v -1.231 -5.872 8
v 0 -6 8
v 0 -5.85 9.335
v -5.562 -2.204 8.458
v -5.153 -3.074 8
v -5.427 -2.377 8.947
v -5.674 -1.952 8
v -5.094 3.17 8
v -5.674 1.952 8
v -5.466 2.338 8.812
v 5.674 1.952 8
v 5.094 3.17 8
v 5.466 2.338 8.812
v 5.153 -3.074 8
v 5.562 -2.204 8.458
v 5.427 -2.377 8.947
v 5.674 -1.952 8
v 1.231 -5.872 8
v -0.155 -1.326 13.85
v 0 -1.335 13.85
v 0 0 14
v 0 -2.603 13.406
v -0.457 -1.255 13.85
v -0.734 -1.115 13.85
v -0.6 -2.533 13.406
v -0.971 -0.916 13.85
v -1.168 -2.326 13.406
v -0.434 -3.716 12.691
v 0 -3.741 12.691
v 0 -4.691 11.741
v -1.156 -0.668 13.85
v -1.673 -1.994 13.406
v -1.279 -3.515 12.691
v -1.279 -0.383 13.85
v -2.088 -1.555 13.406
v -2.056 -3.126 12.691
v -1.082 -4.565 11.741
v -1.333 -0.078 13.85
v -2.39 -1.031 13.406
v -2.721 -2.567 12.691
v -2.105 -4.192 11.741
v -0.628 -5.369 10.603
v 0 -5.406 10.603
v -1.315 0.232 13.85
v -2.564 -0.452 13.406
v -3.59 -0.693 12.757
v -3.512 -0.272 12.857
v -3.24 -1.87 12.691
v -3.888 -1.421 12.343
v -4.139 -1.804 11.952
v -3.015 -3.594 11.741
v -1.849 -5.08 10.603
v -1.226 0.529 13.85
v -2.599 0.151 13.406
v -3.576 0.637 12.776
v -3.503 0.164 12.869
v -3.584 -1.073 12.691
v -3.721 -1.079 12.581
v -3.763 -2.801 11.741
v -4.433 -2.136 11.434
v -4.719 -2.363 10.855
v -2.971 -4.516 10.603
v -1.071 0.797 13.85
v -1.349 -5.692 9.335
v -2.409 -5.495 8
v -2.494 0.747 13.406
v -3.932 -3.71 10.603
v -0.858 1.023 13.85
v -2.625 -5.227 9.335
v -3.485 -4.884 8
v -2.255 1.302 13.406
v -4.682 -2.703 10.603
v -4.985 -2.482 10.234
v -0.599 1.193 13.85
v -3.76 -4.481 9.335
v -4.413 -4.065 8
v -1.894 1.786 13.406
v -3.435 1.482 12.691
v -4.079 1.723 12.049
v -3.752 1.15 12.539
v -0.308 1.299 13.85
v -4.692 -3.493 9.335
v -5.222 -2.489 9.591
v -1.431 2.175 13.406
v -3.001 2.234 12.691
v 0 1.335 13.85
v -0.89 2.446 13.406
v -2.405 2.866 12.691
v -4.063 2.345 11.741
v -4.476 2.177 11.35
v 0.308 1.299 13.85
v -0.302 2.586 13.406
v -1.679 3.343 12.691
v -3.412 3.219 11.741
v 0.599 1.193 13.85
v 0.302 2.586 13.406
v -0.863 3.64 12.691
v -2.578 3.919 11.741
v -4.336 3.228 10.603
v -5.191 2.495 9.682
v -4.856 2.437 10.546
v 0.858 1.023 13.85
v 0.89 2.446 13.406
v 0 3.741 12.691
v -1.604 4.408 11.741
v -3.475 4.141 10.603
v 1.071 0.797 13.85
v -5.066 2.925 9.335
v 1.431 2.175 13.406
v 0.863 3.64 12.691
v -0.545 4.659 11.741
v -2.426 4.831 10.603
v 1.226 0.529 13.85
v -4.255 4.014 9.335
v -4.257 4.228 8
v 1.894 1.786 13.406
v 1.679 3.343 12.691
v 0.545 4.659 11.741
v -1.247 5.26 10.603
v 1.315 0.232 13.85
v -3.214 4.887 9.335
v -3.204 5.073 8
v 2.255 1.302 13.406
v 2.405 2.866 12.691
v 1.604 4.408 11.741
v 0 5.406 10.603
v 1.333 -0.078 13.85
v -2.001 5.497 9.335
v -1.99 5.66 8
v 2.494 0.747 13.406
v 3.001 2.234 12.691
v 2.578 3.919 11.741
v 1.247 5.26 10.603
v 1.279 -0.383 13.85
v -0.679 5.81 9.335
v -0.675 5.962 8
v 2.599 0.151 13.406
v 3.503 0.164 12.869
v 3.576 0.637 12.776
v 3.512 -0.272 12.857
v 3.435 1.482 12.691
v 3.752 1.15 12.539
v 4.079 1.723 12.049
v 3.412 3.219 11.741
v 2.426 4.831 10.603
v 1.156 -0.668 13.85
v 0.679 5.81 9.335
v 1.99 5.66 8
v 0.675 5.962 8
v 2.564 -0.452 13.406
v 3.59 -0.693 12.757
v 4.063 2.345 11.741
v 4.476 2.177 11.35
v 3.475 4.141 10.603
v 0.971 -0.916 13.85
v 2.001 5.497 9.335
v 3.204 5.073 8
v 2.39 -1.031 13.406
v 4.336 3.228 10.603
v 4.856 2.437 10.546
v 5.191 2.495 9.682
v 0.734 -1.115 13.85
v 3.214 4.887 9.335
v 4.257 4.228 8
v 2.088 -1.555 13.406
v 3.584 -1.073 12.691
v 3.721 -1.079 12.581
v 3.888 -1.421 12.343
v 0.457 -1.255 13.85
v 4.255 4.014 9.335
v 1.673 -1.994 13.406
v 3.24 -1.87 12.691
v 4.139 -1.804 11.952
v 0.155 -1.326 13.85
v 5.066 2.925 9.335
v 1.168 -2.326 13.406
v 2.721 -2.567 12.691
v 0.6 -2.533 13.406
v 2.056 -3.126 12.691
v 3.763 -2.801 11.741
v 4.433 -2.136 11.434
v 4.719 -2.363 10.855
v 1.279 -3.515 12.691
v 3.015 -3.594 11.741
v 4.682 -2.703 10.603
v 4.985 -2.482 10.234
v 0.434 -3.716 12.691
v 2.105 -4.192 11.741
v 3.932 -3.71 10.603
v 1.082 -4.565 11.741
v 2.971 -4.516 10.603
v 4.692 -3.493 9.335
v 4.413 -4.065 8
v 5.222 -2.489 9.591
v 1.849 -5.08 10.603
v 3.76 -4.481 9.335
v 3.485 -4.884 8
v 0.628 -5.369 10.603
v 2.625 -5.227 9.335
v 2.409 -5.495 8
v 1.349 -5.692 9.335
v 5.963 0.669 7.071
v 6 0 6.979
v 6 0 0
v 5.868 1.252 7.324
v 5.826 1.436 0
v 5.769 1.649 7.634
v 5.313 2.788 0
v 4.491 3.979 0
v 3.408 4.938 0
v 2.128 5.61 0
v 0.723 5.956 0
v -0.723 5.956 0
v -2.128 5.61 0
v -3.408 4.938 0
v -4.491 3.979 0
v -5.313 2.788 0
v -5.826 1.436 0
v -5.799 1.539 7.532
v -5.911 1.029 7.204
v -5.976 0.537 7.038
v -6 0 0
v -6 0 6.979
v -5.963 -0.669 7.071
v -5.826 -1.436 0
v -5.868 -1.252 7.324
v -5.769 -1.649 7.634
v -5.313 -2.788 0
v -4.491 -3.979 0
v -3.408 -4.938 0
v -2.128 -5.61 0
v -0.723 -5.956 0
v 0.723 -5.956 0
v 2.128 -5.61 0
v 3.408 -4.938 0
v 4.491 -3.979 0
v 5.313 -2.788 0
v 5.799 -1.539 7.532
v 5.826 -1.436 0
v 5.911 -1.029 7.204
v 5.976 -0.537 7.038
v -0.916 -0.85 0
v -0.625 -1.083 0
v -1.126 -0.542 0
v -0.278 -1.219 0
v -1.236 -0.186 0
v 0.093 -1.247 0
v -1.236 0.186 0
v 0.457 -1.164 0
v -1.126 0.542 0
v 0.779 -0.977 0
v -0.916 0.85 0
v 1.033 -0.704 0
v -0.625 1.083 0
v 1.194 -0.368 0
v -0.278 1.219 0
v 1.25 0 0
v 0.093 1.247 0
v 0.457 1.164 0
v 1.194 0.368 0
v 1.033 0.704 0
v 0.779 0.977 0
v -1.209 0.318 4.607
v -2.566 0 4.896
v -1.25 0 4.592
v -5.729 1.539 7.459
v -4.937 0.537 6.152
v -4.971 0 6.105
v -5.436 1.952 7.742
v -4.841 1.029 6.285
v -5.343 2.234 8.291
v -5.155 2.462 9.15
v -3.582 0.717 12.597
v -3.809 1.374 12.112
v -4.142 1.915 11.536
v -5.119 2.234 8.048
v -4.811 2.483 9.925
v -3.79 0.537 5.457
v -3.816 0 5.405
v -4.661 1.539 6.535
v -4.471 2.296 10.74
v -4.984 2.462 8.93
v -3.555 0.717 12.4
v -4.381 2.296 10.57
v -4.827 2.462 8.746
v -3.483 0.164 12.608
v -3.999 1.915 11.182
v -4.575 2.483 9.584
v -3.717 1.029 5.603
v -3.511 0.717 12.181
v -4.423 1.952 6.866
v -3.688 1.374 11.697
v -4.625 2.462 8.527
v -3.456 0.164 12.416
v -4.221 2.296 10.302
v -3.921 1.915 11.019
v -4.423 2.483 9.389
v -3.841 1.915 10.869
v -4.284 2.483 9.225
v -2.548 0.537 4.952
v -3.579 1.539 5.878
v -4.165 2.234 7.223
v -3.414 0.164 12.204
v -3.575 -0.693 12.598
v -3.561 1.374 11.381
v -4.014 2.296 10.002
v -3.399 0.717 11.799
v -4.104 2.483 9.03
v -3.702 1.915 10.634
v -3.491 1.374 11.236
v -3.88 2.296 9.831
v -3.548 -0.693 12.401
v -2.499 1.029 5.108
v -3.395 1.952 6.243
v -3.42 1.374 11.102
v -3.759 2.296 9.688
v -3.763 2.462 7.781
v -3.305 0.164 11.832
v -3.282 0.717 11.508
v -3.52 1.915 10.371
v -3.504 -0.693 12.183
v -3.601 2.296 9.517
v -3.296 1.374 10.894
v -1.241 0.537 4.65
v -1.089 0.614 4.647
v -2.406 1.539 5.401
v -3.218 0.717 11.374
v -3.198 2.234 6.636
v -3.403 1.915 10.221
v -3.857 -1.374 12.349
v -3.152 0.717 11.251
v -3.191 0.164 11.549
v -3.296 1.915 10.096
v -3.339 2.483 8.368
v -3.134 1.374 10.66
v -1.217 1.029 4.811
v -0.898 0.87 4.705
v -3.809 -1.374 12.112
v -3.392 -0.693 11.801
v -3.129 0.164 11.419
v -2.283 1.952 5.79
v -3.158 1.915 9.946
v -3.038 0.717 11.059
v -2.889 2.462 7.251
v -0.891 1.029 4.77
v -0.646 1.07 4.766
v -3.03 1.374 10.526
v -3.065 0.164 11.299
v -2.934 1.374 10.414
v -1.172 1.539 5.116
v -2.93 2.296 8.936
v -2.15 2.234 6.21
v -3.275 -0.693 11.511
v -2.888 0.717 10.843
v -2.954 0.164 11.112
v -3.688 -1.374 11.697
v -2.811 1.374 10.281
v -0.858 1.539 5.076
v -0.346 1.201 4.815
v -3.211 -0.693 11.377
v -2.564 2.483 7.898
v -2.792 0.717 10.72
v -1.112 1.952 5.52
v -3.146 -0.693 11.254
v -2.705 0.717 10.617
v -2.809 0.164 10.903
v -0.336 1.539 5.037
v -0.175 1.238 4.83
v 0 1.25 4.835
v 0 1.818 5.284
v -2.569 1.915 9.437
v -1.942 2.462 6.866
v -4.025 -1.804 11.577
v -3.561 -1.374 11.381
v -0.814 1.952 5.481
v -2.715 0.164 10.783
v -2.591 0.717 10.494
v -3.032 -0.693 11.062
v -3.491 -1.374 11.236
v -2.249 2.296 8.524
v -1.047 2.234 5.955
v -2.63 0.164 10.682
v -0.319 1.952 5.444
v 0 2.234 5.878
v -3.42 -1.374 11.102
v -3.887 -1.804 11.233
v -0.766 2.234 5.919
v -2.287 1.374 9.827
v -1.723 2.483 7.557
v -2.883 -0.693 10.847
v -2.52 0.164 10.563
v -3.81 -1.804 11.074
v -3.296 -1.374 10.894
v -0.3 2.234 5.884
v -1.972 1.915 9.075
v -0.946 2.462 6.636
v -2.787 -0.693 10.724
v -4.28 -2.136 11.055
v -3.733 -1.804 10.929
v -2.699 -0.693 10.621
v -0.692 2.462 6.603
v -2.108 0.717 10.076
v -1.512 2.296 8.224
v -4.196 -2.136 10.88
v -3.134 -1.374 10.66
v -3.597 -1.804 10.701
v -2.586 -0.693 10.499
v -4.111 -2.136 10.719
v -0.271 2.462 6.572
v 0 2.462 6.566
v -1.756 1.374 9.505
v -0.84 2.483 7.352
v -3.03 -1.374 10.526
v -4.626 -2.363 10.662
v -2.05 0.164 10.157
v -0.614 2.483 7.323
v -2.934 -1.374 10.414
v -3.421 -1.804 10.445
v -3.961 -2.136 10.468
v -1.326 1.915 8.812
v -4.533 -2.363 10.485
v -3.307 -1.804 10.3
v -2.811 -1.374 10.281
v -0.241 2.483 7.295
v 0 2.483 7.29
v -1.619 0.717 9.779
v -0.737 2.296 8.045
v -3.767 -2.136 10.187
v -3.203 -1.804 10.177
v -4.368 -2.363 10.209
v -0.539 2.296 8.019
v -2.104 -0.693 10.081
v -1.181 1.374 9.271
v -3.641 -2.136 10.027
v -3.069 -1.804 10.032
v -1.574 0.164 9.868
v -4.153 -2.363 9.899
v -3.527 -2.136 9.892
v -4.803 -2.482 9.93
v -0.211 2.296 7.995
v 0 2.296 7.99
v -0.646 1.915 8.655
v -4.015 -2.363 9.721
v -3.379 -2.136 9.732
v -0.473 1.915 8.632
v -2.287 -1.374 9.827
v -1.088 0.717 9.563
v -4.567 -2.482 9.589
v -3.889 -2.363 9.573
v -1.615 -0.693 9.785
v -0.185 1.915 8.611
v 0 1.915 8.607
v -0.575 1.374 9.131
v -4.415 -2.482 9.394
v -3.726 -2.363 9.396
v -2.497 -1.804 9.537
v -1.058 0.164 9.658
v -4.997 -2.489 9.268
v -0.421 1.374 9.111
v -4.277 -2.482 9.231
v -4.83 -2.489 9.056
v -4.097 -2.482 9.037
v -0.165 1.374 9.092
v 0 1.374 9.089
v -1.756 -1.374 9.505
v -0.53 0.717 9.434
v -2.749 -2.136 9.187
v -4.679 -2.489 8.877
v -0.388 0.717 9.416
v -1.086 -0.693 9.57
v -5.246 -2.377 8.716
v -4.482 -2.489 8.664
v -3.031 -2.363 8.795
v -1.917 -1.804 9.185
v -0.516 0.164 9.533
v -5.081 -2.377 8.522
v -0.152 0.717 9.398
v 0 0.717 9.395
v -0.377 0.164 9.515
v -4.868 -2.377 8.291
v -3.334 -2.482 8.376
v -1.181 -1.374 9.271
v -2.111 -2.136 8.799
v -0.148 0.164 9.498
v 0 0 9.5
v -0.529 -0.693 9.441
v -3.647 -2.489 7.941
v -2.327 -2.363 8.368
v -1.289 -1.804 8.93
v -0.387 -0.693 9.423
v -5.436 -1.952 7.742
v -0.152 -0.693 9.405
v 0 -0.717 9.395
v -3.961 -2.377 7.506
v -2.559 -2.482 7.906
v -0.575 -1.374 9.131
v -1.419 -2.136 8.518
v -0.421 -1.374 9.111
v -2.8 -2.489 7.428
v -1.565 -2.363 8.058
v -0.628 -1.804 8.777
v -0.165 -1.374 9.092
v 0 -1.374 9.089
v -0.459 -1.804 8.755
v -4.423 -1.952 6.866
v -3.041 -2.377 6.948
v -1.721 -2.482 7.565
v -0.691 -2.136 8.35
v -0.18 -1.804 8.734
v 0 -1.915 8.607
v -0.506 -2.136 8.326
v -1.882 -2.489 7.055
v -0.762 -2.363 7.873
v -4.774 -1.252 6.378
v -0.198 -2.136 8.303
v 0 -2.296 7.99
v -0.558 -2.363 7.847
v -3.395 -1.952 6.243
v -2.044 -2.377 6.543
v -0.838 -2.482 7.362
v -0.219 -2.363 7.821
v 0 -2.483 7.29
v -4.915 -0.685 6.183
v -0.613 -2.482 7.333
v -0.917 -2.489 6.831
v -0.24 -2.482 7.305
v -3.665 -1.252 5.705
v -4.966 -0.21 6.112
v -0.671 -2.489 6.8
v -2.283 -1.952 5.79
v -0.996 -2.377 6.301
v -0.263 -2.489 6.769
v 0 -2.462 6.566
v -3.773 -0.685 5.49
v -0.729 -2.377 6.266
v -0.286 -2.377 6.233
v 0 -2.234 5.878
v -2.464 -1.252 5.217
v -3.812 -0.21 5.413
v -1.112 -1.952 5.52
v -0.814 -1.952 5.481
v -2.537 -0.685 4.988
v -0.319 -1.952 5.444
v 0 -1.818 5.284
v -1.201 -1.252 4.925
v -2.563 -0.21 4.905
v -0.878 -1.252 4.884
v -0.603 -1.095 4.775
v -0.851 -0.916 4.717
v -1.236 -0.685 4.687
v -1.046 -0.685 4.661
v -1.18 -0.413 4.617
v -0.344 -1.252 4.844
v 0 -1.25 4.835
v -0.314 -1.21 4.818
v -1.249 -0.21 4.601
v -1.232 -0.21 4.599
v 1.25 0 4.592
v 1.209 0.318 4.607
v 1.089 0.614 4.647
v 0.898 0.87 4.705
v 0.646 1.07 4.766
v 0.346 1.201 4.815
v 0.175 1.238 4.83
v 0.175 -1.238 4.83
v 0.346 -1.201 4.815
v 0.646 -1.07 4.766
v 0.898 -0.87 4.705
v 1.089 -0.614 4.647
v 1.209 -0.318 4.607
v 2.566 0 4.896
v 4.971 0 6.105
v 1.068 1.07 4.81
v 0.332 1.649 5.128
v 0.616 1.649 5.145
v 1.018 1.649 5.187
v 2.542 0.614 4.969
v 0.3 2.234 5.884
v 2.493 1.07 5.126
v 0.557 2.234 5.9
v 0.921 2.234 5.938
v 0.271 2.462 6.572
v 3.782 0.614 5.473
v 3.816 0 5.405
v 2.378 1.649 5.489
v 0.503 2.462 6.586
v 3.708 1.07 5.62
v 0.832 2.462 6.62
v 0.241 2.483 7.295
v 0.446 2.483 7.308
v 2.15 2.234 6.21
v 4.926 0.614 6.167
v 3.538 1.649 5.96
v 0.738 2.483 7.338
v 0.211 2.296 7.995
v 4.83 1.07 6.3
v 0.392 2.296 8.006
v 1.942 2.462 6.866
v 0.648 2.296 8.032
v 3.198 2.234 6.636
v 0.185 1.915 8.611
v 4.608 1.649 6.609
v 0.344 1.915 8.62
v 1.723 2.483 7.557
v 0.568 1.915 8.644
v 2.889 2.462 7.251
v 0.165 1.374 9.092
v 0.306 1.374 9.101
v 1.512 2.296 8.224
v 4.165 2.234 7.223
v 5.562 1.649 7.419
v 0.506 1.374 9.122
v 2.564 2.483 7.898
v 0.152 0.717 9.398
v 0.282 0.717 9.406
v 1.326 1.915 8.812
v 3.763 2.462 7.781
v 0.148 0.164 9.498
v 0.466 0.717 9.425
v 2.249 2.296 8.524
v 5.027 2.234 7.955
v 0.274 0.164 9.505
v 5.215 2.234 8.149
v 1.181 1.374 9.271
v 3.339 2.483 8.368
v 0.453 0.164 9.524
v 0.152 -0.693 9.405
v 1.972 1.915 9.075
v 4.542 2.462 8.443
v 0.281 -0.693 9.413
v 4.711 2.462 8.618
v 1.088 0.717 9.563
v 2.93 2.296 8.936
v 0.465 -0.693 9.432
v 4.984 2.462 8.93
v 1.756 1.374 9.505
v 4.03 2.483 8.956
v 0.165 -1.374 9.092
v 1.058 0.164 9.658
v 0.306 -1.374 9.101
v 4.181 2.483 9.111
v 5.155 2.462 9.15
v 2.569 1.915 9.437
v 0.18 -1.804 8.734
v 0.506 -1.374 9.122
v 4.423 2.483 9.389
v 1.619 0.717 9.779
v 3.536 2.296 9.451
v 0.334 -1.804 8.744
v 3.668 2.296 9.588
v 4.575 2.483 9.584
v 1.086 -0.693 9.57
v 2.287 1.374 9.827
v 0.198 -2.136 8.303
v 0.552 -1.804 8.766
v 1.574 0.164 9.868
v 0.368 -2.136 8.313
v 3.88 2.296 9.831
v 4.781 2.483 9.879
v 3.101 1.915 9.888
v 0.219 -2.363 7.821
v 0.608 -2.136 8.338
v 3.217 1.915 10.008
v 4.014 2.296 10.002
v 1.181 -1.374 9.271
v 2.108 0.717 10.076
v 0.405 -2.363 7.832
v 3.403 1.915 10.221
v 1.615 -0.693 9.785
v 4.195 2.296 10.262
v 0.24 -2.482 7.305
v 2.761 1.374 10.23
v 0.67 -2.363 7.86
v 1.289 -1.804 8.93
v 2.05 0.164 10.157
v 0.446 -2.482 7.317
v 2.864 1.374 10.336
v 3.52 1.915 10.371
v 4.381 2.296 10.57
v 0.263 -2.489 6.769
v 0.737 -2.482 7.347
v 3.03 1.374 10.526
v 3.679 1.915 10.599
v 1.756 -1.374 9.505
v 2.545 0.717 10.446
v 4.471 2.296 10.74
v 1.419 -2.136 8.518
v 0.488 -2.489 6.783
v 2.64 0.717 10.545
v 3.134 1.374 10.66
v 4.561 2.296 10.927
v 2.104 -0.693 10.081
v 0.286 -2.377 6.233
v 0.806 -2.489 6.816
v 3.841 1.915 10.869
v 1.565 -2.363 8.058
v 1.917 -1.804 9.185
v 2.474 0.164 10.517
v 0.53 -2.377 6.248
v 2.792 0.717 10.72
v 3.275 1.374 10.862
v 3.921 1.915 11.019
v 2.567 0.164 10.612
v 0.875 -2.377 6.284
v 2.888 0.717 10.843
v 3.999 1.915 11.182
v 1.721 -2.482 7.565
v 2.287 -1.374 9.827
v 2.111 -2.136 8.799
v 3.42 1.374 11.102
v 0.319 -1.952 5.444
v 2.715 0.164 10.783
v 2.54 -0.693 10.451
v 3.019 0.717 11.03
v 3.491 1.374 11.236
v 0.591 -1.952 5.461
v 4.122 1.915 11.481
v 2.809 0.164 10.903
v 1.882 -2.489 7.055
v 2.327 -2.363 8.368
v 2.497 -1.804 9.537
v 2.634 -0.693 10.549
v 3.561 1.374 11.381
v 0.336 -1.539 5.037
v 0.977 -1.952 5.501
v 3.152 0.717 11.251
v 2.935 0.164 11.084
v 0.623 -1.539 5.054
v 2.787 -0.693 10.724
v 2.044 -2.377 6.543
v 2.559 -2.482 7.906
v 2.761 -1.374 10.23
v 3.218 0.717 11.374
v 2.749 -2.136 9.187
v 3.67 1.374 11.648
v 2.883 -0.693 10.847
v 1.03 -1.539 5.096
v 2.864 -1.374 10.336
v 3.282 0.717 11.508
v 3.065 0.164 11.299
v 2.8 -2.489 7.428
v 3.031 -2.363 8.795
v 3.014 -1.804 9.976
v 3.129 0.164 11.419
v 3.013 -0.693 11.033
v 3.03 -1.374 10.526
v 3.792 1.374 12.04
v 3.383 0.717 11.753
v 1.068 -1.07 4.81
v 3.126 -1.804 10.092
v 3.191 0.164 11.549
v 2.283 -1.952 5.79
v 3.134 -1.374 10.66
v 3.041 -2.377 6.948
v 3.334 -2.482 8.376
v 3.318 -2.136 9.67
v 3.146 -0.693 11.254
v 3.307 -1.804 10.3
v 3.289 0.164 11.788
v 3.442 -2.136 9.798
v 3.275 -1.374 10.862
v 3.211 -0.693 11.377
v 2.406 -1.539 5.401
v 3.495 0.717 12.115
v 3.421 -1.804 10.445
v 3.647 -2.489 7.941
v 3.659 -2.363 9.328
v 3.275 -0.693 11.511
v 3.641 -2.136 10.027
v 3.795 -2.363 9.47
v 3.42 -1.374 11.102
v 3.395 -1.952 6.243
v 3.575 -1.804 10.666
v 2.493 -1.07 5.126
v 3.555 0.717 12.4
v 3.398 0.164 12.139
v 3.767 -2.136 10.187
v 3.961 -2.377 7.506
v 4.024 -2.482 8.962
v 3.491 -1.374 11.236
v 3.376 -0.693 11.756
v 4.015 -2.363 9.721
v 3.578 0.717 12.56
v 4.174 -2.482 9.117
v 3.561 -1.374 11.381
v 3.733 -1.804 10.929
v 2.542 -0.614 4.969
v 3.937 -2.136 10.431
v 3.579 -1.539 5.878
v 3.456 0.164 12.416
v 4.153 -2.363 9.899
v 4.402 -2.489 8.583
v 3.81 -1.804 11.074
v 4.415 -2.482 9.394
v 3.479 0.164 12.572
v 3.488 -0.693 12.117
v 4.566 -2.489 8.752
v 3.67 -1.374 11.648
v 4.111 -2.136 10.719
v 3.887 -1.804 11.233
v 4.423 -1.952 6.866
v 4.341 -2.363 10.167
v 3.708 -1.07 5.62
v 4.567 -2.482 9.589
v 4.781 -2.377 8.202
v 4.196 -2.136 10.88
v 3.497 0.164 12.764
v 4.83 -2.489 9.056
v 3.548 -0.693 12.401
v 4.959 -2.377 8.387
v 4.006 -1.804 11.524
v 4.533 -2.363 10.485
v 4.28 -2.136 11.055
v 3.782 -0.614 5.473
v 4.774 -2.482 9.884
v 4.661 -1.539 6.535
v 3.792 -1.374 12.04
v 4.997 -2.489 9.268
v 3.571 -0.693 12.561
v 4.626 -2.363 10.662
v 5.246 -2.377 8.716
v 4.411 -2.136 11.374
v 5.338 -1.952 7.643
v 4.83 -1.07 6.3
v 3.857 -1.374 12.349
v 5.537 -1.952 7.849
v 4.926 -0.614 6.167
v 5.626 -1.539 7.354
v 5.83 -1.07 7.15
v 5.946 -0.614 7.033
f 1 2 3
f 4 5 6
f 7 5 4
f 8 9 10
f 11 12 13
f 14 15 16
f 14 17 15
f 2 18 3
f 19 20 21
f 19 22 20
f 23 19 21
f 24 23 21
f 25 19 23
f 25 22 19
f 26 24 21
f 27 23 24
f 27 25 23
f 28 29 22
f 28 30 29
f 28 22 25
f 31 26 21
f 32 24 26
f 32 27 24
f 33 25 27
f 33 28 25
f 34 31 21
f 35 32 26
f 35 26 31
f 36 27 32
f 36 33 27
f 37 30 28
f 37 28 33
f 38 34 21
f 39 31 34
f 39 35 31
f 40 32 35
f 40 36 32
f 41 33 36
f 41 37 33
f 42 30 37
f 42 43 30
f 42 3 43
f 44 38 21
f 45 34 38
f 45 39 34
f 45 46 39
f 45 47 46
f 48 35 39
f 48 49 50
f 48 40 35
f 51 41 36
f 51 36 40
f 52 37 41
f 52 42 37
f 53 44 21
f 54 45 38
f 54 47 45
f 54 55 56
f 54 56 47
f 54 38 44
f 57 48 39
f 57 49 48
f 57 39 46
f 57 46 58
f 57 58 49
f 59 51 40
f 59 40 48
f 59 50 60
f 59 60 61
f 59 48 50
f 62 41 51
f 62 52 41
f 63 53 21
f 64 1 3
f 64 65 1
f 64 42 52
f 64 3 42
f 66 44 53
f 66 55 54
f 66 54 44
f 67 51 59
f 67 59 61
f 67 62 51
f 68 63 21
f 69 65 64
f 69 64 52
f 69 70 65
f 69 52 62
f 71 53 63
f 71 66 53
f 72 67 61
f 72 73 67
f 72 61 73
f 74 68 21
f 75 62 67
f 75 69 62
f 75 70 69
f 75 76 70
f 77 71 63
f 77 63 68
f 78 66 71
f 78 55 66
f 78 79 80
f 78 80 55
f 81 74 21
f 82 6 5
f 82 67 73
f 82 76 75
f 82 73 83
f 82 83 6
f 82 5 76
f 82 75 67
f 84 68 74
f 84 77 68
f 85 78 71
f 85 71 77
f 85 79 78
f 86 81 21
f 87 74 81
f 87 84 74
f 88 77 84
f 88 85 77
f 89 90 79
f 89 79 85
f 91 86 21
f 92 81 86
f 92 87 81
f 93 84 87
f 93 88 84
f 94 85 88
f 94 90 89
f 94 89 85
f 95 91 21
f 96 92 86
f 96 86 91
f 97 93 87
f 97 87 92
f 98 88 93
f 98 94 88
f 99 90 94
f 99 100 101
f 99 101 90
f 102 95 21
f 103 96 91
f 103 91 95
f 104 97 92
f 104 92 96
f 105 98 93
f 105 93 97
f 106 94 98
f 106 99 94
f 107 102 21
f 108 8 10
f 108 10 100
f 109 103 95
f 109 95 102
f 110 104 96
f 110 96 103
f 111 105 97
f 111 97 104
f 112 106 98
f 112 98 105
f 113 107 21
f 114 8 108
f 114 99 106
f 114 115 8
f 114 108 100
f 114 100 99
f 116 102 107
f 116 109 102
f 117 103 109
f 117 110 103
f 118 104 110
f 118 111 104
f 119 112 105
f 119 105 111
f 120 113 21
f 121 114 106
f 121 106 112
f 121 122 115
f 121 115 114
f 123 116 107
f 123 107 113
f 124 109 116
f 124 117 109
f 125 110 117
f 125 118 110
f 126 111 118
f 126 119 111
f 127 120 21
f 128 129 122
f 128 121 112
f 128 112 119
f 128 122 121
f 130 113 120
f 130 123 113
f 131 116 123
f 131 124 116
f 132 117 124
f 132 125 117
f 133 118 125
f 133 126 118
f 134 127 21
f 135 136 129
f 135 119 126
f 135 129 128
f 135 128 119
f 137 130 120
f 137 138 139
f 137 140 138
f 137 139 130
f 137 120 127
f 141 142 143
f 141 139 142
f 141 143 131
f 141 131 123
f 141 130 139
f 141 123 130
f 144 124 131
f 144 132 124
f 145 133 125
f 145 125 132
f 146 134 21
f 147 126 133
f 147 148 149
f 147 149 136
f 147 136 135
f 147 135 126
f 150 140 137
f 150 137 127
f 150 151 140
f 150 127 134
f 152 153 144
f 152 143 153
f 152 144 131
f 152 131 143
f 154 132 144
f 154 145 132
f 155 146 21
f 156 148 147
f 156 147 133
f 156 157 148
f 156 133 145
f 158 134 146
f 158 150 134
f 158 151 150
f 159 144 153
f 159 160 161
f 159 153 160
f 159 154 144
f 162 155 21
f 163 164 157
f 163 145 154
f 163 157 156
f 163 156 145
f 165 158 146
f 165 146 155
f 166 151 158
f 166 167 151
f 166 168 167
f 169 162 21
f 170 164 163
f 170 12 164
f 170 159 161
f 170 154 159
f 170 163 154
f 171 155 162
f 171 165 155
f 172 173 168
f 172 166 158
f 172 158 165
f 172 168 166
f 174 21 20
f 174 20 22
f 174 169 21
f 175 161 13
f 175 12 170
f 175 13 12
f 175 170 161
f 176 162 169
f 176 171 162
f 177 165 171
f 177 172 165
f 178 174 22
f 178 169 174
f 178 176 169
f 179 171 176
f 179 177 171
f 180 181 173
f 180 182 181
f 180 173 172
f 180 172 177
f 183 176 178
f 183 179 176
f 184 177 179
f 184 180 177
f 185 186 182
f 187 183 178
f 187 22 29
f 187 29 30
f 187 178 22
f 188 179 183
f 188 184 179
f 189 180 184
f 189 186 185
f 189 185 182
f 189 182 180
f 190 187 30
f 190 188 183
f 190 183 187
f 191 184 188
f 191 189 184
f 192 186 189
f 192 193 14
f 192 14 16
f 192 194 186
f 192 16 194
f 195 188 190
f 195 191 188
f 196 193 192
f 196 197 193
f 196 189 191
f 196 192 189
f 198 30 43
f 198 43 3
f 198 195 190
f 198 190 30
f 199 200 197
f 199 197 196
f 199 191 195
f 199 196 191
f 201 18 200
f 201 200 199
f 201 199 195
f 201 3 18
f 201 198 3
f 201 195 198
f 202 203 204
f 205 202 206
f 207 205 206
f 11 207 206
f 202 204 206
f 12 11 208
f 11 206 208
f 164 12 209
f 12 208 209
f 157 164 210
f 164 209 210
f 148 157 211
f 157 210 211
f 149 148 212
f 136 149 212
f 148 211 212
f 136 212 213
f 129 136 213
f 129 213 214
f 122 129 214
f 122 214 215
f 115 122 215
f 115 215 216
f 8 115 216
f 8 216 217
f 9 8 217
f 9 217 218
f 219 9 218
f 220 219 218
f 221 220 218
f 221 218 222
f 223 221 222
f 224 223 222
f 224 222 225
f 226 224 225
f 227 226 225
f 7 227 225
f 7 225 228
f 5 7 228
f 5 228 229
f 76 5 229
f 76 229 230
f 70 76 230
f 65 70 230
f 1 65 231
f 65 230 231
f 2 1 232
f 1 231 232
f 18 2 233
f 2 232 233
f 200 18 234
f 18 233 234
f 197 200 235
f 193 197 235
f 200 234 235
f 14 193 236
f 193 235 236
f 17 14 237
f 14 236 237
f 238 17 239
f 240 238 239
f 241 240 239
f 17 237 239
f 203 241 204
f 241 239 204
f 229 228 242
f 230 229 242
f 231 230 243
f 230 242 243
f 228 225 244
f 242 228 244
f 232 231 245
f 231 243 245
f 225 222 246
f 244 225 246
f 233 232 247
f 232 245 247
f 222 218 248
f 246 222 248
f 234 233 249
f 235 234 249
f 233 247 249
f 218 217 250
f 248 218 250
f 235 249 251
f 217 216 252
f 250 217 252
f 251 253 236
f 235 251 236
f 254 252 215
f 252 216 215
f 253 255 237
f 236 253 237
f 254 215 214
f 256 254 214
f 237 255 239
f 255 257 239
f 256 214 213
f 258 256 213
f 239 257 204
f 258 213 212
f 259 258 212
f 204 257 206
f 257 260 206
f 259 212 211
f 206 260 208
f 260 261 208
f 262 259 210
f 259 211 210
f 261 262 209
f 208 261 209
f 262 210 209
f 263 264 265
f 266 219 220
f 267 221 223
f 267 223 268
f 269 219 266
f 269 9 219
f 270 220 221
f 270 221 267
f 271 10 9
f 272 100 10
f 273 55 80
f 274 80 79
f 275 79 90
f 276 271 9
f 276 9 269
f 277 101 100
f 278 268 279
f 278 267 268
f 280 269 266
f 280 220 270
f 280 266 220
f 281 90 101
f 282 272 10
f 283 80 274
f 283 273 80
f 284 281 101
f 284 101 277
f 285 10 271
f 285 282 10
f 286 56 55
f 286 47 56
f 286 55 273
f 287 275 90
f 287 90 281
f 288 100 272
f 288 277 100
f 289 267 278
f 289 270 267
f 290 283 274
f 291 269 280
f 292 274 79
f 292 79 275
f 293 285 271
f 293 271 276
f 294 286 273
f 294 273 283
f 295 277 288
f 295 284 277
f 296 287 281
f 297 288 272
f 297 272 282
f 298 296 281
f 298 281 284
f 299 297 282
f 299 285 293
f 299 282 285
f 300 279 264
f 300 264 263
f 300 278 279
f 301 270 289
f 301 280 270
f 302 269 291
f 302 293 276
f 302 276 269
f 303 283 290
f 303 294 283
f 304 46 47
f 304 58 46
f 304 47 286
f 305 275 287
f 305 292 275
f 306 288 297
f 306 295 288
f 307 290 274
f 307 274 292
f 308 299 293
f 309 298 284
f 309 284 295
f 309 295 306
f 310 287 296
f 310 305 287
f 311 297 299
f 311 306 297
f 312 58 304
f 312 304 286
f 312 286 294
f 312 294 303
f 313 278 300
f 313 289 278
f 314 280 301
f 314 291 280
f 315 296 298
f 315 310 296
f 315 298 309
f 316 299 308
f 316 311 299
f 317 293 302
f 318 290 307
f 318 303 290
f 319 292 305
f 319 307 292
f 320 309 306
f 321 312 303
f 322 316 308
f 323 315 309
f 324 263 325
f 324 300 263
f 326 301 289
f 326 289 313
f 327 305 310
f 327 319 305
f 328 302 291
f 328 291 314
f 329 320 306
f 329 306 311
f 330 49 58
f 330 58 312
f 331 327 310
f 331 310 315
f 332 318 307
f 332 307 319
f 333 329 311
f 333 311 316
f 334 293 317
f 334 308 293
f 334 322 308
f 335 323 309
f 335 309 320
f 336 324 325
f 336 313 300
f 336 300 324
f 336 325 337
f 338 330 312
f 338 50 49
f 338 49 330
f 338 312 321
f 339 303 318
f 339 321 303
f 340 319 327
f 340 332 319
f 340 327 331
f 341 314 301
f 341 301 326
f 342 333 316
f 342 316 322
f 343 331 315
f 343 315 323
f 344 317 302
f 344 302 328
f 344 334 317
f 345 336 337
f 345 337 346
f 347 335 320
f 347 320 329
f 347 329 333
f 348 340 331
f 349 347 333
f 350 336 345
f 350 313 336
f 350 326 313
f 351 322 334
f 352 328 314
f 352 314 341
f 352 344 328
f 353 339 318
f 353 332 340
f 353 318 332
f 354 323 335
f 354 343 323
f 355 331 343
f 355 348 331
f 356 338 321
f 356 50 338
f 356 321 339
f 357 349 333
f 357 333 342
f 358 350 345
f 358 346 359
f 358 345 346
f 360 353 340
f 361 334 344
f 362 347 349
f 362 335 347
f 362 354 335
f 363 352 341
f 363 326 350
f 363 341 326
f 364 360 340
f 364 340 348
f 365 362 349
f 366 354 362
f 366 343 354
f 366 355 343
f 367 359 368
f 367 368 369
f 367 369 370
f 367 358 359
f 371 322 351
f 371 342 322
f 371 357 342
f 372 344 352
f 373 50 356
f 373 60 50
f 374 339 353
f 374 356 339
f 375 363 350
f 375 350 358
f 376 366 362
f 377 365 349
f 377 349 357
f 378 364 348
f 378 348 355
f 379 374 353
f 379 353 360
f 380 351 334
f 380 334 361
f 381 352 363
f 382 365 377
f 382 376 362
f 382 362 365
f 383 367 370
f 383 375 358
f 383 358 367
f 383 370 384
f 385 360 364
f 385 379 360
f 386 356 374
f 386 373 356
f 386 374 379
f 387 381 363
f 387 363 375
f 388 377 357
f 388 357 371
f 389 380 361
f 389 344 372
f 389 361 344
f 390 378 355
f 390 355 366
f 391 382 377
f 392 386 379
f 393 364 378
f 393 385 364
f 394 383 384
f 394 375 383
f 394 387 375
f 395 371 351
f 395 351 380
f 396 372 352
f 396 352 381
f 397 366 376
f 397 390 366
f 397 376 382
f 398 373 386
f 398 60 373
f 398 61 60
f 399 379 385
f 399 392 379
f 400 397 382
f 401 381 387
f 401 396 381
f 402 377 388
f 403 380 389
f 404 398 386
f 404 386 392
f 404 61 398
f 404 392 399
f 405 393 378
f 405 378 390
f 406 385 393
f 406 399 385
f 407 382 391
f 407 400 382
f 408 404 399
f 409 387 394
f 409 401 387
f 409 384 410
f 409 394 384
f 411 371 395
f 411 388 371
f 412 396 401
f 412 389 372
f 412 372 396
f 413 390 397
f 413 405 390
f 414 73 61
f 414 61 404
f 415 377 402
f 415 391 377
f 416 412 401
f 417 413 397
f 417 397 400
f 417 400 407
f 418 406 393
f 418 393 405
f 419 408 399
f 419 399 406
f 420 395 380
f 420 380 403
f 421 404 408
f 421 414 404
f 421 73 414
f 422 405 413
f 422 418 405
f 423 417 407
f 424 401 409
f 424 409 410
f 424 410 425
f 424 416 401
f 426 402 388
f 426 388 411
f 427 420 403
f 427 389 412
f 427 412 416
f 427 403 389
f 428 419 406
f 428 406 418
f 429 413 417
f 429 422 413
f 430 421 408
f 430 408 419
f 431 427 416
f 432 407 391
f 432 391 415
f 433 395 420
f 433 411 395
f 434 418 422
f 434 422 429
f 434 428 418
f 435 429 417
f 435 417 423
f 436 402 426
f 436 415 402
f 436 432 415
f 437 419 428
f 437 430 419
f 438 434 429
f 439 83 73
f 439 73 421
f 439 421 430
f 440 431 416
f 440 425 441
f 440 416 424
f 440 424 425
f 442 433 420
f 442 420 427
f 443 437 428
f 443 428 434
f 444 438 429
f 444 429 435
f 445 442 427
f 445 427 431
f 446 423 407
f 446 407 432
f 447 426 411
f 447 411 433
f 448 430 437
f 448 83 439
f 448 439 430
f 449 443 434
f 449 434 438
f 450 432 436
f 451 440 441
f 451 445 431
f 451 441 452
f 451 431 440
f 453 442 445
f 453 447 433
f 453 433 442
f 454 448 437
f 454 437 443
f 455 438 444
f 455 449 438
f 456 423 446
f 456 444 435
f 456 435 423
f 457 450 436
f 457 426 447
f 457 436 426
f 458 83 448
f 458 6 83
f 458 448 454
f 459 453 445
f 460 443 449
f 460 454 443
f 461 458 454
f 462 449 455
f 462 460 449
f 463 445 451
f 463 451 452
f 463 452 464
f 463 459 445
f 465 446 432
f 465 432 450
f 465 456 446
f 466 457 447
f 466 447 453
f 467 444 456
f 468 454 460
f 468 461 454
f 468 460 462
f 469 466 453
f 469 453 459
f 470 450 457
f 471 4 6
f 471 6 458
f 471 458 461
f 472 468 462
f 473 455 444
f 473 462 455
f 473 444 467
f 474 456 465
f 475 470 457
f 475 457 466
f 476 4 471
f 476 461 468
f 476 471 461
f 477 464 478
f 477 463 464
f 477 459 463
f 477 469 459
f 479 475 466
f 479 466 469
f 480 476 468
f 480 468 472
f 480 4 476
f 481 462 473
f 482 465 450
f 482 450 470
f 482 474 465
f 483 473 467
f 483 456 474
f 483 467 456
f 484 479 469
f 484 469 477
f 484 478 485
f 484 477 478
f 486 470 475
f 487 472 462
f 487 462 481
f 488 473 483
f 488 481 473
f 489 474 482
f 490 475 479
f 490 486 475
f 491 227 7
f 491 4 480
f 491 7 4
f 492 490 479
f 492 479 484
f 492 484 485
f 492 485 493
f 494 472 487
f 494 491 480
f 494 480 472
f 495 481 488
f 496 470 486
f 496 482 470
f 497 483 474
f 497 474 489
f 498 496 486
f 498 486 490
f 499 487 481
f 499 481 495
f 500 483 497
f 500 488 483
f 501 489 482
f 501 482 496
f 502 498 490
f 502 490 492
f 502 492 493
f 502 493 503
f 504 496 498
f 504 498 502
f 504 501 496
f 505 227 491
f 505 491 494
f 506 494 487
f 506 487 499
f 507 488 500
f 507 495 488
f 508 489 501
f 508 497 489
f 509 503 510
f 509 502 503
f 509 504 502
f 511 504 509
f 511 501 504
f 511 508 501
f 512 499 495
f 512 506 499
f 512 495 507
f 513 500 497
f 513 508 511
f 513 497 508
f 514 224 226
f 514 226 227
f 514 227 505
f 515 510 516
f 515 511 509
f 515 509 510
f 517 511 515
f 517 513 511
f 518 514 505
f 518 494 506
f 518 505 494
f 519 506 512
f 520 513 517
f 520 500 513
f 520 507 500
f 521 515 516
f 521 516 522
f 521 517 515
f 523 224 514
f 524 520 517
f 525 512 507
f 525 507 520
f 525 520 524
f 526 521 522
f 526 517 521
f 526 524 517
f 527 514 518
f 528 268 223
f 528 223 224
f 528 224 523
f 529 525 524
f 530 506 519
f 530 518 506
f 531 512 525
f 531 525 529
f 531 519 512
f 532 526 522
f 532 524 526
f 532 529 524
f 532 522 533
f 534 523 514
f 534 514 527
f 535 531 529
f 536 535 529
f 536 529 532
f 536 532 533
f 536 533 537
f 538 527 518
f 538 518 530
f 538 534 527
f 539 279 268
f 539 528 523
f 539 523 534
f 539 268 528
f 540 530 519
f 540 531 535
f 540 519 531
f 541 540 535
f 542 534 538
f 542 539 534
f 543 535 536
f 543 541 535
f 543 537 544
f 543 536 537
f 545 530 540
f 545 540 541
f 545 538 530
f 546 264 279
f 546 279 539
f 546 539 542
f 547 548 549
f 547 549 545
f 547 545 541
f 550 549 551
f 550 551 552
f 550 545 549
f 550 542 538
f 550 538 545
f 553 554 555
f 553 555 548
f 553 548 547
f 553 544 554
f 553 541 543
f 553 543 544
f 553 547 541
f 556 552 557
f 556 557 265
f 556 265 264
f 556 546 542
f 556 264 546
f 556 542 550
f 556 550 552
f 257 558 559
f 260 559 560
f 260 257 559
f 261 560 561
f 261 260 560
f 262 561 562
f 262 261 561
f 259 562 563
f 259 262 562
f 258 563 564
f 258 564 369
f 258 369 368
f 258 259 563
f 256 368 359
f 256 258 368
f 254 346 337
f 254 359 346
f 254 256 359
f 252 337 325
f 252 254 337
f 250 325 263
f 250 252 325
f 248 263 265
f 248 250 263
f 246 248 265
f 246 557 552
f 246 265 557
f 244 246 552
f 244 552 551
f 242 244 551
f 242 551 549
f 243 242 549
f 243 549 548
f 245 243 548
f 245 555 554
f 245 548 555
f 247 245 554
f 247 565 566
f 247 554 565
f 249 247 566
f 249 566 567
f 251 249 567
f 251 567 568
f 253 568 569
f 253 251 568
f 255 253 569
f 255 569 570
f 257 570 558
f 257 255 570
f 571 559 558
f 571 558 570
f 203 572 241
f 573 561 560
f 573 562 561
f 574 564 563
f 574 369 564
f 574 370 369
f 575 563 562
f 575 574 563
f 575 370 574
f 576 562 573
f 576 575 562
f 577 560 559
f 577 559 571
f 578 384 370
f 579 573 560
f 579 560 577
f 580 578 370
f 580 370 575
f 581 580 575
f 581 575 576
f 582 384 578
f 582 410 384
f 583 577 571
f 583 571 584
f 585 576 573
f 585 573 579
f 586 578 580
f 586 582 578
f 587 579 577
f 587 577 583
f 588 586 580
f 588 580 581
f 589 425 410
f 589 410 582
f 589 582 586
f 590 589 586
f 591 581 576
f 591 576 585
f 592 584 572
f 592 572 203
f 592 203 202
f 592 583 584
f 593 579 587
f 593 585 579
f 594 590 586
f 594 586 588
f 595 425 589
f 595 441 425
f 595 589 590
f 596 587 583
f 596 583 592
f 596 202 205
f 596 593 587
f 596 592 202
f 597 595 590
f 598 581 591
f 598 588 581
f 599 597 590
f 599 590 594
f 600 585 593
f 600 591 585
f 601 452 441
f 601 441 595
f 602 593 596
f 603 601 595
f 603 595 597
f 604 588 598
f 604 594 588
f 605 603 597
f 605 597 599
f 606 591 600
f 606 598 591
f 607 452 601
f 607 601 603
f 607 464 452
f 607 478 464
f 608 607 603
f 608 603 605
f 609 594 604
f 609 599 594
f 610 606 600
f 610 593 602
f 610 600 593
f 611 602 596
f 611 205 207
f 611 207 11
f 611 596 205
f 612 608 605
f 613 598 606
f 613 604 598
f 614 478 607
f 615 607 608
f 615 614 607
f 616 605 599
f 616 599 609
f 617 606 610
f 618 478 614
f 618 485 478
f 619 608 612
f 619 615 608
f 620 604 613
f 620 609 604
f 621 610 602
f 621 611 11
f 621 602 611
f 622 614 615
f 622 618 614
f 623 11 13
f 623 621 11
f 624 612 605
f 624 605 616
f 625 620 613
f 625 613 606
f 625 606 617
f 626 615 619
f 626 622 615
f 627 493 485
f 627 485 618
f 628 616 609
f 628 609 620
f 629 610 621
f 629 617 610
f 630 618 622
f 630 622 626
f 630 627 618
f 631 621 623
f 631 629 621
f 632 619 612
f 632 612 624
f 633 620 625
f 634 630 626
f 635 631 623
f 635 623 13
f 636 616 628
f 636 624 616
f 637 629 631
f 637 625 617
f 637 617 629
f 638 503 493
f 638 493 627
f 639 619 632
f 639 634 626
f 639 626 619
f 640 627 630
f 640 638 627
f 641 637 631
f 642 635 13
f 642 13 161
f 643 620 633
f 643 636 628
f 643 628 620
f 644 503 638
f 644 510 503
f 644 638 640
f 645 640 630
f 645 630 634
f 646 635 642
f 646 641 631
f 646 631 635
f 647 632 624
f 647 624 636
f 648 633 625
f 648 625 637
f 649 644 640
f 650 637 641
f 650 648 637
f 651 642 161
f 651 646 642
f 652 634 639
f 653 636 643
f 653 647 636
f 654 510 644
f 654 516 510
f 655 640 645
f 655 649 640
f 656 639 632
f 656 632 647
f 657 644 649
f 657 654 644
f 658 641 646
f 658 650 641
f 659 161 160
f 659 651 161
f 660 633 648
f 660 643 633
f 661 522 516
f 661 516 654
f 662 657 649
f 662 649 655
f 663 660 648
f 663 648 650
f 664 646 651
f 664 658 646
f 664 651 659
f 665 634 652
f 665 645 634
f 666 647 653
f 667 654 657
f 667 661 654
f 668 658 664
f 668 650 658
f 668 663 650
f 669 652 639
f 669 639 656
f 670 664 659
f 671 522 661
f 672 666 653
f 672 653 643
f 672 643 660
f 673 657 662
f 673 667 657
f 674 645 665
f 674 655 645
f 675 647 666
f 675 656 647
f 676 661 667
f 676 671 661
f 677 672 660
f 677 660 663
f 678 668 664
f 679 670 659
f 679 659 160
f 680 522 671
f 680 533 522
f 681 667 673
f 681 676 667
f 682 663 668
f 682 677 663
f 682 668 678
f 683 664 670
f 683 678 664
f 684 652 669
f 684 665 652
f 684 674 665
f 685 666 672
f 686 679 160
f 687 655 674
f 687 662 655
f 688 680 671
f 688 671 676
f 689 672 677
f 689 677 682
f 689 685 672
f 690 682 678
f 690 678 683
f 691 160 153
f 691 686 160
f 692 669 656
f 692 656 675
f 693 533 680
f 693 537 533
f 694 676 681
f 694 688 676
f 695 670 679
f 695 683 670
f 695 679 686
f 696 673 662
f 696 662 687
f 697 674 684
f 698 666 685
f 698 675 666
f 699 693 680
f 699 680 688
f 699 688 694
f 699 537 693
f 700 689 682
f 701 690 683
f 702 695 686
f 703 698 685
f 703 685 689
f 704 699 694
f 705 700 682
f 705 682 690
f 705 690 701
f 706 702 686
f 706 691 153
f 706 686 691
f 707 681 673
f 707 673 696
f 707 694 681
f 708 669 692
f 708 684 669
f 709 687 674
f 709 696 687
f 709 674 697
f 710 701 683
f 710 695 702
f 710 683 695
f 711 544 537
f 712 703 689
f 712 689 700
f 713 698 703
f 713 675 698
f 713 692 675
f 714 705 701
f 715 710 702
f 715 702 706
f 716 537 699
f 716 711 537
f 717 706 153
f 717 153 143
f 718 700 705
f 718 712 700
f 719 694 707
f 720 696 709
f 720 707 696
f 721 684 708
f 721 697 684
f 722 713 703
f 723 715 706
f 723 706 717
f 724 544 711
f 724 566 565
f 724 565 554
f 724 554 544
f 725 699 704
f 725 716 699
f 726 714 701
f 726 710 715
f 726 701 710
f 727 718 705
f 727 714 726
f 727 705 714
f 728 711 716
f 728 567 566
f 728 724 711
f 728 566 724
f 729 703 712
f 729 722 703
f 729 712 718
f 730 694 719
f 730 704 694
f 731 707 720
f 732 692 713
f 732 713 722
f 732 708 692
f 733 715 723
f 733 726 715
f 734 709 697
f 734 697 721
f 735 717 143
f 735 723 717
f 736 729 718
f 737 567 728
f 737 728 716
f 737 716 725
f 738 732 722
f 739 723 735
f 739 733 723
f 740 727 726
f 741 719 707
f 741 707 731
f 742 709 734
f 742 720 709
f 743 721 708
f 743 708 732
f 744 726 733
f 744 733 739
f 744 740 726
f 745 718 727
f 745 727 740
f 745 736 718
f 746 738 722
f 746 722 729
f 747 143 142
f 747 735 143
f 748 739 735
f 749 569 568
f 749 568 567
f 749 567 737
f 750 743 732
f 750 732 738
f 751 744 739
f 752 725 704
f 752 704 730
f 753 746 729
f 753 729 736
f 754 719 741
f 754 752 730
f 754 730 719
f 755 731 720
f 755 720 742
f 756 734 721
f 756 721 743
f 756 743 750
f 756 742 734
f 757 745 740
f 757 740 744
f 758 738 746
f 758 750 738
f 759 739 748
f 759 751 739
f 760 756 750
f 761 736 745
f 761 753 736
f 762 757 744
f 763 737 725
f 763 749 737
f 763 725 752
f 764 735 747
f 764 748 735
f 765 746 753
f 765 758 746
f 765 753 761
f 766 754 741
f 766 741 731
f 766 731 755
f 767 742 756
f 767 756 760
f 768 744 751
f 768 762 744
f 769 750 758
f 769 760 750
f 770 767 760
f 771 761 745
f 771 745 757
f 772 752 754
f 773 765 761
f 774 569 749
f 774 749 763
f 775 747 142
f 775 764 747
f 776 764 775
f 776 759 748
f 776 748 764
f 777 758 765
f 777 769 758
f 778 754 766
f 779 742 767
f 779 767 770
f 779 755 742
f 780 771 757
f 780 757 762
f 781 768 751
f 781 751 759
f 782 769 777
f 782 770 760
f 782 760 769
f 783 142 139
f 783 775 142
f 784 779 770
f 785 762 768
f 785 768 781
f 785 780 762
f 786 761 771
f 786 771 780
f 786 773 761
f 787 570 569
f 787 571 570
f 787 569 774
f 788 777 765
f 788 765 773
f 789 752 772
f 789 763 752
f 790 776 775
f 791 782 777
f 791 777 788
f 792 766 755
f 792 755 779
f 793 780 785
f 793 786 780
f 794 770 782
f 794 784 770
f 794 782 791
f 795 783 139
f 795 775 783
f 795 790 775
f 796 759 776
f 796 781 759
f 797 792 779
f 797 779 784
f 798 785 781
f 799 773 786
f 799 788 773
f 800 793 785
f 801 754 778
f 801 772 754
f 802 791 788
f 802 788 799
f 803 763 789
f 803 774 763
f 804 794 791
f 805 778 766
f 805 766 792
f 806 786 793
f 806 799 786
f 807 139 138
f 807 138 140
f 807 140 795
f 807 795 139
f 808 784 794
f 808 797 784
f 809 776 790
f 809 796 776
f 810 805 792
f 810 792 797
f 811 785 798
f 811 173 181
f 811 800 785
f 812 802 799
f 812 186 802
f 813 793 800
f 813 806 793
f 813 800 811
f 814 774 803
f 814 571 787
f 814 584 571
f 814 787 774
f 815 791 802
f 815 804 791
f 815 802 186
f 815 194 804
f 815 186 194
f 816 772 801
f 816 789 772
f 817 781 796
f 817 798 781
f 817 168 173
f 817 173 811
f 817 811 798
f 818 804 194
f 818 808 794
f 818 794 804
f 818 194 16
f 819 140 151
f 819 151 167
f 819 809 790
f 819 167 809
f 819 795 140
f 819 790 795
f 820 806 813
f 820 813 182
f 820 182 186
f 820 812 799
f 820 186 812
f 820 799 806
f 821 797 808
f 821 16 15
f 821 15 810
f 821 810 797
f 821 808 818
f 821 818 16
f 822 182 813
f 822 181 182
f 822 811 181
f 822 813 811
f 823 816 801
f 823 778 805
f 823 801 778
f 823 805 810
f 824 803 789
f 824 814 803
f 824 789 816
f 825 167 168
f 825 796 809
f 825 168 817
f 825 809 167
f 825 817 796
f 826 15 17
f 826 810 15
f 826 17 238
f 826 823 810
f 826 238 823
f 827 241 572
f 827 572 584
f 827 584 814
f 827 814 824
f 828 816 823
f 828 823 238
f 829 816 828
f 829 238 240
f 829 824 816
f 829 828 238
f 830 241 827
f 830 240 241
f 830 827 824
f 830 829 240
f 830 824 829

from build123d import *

# Parameters (mm, degrees)
SKETCH1_R   = 6
SKETCH1_R_2 = 1.25
MAIN_DEPTH  = 8
SKETCH4_R   = 2.5


with BuildPart() as part:
    # Sketch1 → Main (new body)
    with BuildSketch(Plane.XY):
        Circle(SKETCH1_R)
        Circle(SKETCH1_R_2, mode=Mode.SUBTRACT)
    extrude(amount=MAIN_DEPTH)

    # Sketch3 → TopMain (revolve)
    with BuildSketch(Plane(origin=(0, 0, 0), x_dir=(0, 0, -1), z_dir=(1, 0, 0))):
        with BuildLine():
            Line((-8, 0), (-14, 0))
            ThreePointArc((-14, 0), (-12.242640687, -4.242640687), (-8, -6))
            Line((-8, -6), (-8, 0))
        make_face()
    revolve(axis=Axis((0, 0, 10.5), (0, 0, -1)))

    # Sketch4 → HookHole (revolve, cut)
    with BuildSketch(Plane(origin=(0, 0, 0), x_dir=(0, 0, -1), z_dir=(1, 0, 0))):
        with Locations((-7, 0)):
            Circle(SKETCH4_R)
    revolve(axis=Axis((0, 6.6, 13), (0, -1, 0)), mode=Mode.SUBTRACT)


solid = part.part
